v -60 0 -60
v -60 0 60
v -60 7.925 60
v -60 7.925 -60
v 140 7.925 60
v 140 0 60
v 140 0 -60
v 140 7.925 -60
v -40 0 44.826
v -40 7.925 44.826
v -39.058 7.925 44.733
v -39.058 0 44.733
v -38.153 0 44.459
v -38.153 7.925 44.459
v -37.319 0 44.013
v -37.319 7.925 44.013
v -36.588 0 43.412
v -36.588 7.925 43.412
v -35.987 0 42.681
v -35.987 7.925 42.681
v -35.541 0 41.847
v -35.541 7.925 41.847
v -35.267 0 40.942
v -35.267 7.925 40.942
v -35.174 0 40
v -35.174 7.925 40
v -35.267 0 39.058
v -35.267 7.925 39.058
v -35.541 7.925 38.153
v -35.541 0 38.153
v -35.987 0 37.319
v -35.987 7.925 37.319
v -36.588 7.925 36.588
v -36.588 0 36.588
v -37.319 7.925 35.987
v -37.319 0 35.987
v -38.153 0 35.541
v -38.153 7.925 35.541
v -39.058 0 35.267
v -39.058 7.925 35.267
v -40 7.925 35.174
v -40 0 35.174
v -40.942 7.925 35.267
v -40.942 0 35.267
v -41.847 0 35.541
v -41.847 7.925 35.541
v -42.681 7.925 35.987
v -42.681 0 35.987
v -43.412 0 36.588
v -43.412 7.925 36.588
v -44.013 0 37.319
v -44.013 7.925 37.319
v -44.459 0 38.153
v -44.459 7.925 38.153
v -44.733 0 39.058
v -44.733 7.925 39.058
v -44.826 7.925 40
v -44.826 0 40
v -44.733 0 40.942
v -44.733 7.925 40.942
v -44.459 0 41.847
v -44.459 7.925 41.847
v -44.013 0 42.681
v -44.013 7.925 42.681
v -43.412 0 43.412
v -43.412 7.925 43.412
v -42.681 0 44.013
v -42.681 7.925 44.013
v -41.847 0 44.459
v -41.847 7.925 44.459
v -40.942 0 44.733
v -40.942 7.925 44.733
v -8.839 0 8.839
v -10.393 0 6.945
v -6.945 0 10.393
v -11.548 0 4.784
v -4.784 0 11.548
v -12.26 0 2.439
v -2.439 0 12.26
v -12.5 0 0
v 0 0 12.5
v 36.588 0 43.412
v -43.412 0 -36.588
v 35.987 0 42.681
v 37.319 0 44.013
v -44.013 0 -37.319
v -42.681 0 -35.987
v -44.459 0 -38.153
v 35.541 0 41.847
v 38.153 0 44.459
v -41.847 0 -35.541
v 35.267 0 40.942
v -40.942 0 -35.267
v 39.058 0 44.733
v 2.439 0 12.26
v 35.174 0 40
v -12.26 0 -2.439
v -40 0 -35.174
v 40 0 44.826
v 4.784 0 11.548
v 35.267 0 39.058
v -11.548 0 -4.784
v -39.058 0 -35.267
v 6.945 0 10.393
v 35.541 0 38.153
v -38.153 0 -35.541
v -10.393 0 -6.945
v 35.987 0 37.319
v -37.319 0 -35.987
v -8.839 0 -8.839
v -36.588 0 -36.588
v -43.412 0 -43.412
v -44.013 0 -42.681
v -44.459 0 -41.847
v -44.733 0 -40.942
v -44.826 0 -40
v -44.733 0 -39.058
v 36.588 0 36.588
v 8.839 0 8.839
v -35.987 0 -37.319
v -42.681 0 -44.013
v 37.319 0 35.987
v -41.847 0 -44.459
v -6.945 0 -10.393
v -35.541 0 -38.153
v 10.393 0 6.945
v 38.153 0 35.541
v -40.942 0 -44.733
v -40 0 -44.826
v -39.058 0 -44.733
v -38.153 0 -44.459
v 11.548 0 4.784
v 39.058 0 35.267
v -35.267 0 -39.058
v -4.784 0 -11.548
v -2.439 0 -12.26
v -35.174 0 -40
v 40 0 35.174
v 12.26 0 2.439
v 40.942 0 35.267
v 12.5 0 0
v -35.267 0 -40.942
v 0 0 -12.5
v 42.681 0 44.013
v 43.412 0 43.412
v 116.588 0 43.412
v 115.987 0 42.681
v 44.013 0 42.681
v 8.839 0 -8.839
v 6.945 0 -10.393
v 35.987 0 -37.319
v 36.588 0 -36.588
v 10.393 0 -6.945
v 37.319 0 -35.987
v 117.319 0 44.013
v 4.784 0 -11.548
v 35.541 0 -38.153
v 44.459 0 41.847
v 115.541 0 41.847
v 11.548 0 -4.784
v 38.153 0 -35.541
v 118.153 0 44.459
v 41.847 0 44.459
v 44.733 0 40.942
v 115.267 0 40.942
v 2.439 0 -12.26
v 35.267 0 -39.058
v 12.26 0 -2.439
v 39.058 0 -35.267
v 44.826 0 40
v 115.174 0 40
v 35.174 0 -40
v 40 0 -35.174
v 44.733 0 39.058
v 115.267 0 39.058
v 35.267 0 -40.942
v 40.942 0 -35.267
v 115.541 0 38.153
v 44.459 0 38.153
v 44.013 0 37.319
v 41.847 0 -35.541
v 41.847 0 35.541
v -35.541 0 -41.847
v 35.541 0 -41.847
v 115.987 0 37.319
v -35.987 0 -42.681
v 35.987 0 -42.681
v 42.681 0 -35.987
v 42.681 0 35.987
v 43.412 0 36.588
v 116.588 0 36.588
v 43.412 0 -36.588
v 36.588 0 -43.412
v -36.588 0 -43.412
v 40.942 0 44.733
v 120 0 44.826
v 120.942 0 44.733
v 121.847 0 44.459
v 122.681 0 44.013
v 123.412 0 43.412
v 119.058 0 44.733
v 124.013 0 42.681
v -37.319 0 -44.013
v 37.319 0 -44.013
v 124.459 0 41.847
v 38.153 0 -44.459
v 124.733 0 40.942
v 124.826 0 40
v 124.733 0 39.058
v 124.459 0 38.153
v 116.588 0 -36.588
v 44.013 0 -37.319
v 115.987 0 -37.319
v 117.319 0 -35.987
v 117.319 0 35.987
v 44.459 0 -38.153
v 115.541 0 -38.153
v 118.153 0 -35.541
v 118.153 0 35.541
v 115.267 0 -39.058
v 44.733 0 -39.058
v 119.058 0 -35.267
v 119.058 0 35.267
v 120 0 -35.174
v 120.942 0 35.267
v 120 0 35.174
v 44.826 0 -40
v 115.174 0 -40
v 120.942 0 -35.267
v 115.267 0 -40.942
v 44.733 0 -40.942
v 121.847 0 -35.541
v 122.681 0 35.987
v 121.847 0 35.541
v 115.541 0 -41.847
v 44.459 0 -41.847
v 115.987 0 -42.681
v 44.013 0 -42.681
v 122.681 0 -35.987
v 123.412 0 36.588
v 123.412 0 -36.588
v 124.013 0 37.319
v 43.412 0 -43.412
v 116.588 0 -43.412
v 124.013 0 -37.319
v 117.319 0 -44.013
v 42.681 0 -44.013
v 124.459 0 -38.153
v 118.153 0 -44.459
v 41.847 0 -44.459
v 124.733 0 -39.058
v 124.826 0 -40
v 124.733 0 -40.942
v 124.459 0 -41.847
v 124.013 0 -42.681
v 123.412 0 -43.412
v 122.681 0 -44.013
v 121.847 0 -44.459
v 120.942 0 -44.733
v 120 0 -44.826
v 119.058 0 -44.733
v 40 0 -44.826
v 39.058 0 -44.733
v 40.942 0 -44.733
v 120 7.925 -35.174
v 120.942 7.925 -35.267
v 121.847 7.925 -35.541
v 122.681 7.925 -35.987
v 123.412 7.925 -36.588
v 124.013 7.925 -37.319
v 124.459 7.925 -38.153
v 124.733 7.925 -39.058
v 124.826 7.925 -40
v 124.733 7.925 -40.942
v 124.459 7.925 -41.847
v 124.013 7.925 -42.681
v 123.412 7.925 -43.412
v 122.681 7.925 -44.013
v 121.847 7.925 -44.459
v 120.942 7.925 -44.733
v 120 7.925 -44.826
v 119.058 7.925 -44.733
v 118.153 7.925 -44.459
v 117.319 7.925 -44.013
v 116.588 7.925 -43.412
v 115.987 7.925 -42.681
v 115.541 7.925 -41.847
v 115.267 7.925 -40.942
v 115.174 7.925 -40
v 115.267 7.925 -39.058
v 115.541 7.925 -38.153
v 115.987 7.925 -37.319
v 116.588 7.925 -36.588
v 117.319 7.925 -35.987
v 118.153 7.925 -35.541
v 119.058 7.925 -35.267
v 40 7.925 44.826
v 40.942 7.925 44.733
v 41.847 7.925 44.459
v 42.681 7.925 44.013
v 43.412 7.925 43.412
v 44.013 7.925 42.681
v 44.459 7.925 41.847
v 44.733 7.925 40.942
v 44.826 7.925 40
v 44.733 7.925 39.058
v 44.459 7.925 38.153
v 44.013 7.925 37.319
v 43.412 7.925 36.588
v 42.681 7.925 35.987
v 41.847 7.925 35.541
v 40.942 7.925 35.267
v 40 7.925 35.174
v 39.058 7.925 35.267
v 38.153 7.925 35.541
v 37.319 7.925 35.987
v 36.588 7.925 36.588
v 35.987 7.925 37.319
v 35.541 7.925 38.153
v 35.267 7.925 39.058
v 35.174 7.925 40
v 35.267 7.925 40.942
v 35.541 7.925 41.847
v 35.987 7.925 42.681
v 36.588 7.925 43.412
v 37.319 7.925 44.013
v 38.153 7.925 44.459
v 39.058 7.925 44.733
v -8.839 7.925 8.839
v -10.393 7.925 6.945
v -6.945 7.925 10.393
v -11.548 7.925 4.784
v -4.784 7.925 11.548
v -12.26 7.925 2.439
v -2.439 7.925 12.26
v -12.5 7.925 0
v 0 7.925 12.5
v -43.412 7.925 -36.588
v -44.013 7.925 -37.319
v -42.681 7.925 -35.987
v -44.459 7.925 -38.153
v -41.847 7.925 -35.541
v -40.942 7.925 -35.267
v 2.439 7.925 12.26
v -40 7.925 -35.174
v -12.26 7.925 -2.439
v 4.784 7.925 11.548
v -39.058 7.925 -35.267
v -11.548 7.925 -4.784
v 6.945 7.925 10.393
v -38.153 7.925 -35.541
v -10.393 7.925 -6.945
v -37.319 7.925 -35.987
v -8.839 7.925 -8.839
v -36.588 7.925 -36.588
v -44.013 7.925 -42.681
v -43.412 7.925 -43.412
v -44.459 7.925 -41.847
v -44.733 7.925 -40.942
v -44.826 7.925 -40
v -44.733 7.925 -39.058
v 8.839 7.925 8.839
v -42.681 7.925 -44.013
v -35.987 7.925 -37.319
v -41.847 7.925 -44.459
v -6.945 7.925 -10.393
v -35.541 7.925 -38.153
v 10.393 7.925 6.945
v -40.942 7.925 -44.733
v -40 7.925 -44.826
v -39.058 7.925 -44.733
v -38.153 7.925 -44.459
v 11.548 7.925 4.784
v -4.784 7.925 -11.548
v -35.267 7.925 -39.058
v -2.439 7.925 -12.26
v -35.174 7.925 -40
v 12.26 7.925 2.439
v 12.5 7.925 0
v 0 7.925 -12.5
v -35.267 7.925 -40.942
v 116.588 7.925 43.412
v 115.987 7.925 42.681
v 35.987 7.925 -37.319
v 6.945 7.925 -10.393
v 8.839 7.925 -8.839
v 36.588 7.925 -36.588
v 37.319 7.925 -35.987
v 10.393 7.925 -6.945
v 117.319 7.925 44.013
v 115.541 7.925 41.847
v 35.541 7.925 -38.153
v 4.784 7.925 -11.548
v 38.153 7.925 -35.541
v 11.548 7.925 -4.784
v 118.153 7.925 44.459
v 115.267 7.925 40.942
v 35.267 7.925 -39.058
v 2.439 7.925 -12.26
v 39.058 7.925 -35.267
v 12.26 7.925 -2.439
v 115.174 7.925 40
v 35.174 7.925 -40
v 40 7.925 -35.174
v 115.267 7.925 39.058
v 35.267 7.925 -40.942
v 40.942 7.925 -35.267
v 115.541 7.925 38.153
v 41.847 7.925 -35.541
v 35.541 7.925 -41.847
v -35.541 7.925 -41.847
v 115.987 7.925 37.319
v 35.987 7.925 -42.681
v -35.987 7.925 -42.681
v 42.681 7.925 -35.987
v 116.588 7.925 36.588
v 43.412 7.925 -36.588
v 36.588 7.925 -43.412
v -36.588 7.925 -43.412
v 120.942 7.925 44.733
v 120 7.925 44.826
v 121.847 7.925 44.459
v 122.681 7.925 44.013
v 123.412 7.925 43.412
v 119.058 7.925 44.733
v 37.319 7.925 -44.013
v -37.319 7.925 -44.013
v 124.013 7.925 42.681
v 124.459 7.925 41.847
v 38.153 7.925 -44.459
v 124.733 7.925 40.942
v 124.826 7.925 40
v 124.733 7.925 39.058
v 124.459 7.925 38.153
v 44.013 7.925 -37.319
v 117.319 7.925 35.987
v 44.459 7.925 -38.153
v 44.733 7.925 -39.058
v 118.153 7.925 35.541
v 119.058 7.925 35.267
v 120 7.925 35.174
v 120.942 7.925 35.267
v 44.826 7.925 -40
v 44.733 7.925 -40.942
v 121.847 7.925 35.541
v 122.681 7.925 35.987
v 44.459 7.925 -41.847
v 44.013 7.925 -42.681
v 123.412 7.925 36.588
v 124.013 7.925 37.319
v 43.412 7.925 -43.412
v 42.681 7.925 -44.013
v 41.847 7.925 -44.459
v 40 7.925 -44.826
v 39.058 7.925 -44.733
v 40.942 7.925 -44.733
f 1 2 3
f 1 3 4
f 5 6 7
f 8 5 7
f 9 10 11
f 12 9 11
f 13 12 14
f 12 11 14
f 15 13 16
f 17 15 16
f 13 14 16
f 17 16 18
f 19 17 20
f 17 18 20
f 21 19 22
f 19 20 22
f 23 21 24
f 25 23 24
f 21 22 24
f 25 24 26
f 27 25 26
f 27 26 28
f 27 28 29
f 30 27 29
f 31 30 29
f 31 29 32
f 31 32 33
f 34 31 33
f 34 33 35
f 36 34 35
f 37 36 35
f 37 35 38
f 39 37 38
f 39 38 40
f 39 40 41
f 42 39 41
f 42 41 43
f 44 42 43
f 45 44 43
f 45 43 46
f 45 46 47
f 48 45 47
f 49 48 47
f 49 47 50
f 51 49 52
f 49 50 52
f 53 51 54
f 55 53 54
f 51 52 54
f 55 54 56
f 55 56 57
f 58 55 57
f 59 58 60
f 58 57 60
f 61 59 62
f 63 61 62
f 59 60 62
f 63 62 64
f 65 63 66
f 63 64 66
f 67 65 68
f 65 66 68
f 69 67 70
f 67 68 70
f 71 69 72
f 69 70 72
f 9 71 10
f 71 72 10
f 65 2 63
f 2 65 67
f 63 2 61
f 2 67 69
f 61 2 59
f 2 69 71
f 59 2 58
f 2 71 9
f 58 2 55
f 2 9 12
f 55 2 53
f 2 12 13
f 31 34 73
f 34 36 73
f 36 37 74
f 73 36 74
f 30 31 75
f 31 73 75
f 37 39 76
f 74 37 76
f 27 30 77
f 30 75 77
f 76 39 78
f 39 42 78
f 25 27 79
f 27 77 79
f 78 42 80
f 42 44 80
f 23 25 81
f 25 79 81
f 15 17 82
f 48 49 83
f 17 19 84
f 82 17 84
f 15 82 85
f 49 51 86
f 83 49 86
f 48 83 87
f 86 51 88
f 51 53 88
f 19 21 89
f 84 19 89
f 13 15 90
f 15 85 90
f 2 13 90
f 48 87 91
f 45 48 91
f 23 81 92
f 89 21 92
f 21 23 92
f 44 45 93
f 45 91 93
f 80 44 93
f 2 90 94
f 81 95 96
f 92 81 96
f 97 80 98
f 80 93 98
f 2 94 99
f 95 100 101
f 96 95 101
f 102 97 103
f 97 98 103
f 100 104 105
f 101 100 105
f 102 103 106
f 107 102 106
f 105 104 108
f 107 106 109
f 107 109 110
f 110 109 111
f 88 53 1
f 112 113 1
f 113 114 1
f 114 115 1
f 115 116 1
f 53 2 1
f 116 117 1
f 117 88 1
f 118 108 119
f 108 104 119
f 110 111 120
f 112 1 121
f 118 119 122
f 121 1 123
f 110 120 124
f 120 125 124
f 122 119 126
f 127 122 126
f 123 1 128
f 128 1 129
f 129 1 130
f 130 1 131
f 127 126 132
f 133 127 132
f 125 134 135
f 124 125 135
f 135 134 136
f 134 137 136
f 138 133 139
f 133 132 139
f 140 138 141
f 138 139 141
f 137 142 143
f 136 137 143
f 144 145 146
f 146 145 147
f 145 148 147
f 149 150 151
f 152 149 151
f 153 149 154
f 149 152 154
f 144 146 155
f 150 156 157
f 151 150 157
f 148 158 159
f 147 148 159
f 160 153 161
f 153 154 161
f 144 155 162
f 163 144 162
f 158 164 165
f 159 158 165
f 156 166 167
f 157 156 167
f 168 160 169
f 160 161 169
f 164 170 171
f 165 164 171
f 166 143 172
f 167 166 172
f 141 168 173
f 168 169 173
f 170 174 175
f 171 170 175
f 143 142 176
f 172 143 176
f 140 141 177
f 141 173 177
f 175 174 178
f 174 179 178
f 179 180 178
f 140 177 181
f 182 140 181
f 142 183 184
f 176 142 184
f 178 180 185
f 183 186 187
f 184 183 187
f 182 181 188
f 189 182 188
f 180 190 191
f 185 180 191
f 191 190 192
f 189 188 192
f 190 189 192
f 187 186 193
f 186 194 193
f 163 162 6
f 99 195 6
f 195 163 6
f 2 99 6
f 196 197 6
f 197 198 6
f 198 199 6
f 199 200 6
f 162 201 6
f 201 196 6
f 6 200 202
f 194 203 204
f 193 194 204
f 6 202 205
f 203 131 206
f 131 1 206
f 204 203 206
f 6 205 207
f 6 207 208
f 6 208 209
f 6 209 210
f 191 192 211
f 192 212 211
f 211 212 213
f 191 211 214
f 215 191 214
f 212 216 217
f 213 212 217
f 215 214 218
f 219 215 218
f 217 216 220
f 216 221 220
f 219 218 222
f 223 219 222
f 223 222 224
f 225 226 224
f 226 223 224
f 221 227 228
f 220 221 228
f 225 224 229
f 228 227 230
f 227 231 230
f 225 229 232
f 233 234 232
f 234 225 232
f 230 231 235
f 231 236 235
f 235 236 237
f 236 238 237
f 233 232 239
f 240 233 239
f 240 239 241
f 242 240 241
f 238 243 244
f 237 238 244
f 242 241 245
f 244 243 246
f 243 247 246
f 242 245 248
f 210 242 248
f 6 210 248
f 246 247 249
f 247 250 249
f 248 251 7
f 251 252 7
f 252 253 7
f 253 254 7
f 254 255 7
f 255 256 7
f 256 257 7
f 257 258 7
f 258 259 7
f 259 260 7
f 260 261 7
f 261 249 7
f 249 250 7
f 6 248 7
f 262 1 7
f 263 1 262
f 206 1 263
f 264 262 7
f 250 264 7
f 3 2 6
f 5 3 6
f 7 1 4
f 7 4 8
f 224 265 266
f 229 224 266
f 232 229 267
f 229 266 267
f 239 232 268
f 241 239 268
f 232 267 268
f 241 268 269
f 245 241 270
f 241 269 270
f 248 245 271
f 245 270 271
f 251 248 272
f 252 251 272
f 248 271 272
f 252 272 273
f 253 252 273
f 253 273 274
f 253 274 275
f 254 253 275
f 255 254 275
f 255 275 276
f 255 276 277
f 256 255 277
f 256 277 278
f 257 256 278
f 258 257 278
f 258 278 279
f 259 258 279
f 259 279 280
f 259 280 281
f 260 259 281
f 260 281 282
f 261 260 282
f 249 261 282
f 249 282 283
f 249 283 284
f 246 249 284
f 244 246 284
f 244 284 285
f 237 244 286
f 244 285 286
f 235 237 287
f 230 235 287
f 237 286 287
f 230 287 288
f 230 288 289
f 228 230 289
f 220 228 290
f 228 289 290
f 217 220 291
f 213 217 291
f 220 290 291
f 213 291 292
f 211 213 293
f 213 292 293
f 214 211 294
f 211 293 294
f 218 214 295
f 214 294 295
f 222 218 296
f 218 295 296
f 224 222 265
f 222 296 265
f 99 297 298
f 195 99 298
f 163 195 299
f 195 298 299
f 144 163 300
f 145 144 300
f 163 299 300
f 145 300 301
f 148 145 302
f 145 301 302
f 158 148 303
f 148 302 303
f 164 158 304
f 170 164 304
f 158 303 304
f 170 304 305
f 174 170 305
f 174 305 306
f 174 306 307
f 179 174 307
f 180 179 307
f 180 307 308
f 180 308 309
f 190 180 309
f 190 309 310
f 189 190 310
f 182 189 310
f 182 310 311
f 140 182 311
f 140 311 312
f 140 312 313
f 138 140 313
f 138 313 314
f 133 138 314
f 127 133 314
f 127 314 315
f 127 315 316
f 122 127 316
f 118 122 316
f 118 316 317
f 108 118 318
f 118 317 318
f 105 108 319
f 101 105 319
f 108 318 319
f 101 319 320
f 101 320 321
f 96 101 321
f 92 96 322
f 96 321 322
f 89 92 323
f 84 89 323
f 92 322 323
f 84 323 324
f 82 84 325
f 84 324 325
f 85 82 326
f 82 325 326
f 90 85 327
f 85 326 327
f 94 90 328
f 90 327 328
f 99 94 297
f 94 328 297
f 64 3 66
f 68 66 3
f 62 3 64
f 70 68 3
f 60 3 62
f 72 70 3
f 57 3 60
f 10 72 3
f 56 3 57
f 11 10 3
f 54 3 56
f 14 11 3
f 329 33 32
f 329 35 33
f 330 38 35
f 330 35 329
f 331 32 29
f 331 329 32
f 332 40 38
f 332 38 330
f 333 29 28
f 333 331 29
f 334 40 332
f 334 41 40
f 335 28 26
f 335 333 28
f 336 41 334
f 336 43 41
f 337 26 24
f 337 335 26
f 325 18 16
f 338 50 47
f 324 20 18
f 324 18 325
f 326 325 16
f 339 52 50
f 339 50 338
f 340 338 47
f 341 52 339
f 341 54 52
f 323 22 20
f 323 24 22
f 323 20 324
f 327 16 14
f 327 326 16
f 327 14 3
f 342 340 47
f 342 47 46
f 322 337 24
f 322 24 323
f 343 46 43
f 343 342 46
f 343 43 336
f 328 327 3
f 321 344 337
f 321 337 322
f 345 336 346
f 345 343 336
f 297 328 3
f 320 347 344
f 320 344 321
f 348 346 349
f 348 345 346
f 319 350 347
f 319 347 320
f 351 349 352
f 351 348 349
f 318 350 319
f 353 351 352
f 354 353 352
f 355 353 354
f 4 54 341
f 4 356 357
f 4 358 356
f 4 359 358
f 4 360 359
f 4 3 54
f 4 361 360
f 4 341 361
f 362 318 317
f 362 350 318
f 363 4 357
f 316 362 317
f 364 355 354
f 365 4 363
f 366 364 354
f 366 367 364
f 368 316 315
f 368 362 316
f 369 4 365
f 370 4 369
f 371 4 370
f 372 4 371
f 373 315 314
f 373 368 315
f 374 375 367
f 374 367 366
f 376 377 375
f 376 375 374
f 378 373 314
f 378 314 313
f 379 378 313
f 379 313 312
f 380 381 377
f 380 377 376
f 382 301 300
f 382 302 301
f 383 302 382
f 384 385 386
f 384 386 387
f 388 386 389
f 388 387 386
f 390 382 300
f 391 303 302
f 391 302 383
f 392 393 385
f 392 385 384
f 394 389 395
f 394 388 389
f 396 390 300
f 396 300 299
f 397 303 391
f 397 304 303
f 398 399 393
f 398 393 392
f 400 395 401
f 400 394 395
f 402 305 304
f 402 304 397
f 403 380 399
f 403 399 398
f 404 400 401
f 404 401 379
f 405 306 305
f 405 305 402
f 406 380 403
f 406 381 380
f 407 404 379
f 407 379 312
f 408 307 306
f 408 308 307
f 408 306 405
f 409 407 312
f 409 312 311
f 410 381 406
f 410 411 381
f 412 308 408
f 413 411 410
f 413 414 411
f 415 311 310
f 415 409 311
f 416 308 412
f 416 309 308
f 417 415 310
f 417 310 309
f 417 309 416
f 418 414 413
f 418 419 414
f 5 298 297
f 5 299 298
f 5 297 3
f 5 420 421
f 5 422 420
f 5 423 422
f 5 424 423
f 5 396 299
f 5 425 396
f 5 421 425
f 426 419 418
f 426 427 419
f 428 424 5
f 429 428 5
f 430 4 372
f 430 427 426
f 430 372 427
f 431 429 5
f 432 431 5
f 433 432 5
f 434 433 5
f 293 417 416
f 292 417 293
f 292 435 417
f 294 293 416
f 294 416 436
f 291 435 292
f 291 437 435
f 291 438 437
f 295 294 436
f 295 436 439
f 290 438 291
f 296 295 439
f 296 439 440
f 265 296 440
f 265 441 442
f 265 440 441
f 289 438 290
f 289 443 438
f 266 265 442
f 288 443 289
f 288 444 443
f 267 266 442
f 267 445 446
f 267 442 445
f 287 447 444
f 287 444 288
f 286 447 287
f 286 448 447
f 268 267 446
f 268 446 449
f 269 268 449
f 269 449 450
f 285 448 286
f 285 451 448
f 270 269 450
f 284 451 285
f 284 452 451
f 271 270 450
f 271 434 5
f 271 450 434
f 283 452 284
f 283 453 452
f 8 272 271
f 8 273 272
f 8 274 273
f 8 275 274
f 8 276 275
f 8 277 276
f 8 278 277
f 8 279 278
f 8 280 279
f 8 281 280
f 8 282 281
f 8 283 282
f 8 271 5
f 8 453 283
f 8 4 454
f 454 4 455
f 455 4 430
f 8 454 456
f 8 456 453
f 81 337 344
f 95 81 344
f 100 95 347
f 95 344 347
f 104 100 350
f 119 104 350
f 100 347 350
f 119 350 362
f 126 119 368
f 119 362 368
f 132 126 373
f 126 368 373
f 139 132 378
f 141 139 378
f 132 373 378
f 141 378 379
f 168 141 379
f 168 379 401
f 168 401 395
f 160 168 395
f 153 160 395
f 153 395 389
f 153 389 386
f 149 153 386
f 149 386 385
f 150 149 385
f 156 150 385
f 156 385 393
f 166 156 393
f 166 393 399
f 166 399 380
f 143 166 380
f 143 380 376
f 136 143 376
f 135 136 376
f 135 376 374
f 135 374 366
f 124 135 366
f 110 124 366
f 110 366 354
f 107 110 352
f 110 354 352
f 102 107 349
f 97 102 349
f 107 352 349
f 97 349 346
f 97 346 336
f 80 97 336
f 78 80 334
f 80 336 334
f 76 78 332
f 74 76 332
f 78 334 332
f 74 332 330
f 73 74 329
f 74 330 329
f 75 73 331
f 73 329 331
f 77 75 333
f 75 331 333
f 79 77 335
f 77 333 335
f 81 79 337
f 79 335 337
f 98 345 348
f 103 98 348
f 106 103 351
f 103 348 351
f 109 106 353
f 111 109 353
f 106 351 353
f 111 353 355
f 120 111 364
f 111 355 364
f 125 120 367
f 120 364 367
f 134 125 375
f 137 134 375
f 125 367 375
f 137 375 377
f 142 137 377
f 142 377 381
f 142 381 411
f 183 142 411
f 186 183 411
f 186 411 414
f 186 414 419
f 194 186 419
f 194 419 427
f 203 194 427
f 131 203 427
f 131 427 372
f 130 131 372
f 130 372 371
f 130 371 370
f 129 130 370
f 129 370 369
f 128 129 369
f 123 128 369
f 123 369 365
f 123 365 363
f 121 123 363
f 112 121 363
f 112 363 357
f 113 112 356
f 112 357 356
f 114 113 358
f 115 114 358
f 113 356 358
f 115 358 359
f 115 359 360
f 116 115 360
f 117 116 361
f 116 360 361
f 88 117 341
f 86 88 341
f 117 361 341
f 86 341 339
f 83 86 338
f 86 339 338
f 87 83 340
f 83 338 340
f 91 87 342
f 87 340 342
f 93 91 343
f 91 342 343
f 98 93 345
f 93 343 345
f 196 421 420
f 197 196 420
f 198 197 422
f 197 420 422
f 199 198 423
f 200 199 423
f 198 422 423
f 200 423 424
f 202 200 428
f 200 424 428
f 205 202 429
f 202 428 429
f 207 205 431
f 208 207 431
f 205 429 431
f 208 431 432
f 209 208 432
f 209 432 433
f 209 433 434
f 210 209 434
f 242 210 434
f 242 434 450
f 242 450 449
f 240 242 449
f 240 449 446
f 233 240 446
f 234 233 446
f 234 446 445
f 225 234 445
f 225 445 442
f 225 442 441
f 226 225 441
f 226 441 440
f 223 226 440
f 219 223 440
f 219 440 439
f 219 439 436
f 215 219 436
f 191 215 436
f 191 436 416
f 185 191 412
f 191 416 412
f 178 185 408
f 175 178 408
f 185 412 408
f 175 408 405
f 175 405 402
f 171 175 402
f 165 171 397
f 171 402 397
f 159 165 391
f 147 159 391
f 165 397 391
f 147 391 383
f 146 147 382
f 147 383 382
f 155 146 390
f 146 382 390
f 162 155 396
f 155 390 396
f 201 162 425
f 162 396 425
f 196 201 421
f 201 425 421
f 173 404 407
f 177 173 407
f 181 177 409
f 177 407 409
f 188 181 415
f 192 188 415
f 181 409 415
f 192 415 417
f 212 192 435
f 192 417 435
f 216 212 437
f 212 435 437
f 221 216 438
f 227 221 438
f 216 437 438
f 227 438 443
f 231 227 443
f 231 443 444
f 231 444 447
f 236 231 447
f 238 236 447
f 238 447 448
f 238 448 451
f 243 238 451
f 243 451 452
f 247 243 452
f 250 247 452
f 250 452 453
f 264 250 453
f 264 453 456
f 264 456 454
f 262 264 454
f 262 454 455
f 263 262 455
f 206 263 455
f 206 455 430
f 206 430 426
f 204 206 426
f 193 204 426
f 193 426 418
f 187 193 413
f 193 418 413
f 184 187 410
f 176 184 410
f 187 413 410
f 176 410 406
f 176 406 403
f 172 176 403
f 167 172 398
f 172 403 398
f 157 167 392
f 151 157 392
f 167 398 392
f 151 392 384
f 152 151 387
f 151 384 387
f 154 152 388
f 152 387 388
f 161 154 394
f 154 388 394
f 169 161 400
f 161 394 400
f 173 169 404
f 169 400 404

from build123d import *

# Parameters (mm, degrees)
SKETCH1_W            = 200
SKETCH1_H            = 120
BOSS_EXTRUDE1_DEPTH  = 7.9248
SKETCH3_R            = 4.826
CUT_EXTRUDE1_DEPTH   = 153.521481946
LPATTERN1_COUNT      = 3
LPATTERN1_PITCH      = 80
LPATTERN1_COUNT_DIR2 = 2
LPATTERN1_PITCH_DIR2 = 80
SKETCH6_R            = 12.5
CUT_EXTRUDE2_DEPTH   = 153.521481946


with BuildPart() as part:
    # Sketch1 → Boss-Extrude1 (new body)
    with BuildSketch(Plane(origin=(0, 0, 0), x_dir=(1, 0, 0), z_dir=(0, 1, 0))):
        with Locations((40, 0)):
            Rectangle(SKETCH1_W, SKETCH1_H)
    extrude(amount=BOSS_EXTRUDE1_DEPTH)

    # Sketch3 → Cut-Extrude1 (cut, through all)
    with BuildSketch(Plane(origin=(0, 7.9248, 0), x_dir=(1, 0, 0), z_dir=(0, 1, 0))):
        with Locations(Location((-40, 40, 0), (0, 0, 270))):
            Circle(SKETCH3_R)
    cut_extrude1 = extrude(amount=-CUT_EXTRUDE1_DEPTH, mode=Mode.SUBTRACT)

    # LPattern1: Cut-Extrude1 3 × 2
    with Locations(*[(i * LPATTERN1_PITCH, 0, j * LPATTERN1_PITCH_DIR2) for i in range(LPATTERN1_COUNT) for j in range(LPATTERN1_COUNT_DIR2) if (i, j) != (0, 0)]):
        add(cut_extrude1, mode=Mode.SUBTRACT)

    # Sketch6 → Cut-Extrude2 (cut, through all)
    with BuildSketch(Plane(origin=(0, 7.9248, 0), x_dir=(1, 0, 0), z_dir=(0, 1, 0))):
        with Locations(Location((0, 0, 0), (0, 0, 270))):
            Circle(SKETCH6_R)
    extrude(amount=-CUT_EXTRUDE2_DEPTH, mode=Mode.SUBTRACT)


solid = part.part
